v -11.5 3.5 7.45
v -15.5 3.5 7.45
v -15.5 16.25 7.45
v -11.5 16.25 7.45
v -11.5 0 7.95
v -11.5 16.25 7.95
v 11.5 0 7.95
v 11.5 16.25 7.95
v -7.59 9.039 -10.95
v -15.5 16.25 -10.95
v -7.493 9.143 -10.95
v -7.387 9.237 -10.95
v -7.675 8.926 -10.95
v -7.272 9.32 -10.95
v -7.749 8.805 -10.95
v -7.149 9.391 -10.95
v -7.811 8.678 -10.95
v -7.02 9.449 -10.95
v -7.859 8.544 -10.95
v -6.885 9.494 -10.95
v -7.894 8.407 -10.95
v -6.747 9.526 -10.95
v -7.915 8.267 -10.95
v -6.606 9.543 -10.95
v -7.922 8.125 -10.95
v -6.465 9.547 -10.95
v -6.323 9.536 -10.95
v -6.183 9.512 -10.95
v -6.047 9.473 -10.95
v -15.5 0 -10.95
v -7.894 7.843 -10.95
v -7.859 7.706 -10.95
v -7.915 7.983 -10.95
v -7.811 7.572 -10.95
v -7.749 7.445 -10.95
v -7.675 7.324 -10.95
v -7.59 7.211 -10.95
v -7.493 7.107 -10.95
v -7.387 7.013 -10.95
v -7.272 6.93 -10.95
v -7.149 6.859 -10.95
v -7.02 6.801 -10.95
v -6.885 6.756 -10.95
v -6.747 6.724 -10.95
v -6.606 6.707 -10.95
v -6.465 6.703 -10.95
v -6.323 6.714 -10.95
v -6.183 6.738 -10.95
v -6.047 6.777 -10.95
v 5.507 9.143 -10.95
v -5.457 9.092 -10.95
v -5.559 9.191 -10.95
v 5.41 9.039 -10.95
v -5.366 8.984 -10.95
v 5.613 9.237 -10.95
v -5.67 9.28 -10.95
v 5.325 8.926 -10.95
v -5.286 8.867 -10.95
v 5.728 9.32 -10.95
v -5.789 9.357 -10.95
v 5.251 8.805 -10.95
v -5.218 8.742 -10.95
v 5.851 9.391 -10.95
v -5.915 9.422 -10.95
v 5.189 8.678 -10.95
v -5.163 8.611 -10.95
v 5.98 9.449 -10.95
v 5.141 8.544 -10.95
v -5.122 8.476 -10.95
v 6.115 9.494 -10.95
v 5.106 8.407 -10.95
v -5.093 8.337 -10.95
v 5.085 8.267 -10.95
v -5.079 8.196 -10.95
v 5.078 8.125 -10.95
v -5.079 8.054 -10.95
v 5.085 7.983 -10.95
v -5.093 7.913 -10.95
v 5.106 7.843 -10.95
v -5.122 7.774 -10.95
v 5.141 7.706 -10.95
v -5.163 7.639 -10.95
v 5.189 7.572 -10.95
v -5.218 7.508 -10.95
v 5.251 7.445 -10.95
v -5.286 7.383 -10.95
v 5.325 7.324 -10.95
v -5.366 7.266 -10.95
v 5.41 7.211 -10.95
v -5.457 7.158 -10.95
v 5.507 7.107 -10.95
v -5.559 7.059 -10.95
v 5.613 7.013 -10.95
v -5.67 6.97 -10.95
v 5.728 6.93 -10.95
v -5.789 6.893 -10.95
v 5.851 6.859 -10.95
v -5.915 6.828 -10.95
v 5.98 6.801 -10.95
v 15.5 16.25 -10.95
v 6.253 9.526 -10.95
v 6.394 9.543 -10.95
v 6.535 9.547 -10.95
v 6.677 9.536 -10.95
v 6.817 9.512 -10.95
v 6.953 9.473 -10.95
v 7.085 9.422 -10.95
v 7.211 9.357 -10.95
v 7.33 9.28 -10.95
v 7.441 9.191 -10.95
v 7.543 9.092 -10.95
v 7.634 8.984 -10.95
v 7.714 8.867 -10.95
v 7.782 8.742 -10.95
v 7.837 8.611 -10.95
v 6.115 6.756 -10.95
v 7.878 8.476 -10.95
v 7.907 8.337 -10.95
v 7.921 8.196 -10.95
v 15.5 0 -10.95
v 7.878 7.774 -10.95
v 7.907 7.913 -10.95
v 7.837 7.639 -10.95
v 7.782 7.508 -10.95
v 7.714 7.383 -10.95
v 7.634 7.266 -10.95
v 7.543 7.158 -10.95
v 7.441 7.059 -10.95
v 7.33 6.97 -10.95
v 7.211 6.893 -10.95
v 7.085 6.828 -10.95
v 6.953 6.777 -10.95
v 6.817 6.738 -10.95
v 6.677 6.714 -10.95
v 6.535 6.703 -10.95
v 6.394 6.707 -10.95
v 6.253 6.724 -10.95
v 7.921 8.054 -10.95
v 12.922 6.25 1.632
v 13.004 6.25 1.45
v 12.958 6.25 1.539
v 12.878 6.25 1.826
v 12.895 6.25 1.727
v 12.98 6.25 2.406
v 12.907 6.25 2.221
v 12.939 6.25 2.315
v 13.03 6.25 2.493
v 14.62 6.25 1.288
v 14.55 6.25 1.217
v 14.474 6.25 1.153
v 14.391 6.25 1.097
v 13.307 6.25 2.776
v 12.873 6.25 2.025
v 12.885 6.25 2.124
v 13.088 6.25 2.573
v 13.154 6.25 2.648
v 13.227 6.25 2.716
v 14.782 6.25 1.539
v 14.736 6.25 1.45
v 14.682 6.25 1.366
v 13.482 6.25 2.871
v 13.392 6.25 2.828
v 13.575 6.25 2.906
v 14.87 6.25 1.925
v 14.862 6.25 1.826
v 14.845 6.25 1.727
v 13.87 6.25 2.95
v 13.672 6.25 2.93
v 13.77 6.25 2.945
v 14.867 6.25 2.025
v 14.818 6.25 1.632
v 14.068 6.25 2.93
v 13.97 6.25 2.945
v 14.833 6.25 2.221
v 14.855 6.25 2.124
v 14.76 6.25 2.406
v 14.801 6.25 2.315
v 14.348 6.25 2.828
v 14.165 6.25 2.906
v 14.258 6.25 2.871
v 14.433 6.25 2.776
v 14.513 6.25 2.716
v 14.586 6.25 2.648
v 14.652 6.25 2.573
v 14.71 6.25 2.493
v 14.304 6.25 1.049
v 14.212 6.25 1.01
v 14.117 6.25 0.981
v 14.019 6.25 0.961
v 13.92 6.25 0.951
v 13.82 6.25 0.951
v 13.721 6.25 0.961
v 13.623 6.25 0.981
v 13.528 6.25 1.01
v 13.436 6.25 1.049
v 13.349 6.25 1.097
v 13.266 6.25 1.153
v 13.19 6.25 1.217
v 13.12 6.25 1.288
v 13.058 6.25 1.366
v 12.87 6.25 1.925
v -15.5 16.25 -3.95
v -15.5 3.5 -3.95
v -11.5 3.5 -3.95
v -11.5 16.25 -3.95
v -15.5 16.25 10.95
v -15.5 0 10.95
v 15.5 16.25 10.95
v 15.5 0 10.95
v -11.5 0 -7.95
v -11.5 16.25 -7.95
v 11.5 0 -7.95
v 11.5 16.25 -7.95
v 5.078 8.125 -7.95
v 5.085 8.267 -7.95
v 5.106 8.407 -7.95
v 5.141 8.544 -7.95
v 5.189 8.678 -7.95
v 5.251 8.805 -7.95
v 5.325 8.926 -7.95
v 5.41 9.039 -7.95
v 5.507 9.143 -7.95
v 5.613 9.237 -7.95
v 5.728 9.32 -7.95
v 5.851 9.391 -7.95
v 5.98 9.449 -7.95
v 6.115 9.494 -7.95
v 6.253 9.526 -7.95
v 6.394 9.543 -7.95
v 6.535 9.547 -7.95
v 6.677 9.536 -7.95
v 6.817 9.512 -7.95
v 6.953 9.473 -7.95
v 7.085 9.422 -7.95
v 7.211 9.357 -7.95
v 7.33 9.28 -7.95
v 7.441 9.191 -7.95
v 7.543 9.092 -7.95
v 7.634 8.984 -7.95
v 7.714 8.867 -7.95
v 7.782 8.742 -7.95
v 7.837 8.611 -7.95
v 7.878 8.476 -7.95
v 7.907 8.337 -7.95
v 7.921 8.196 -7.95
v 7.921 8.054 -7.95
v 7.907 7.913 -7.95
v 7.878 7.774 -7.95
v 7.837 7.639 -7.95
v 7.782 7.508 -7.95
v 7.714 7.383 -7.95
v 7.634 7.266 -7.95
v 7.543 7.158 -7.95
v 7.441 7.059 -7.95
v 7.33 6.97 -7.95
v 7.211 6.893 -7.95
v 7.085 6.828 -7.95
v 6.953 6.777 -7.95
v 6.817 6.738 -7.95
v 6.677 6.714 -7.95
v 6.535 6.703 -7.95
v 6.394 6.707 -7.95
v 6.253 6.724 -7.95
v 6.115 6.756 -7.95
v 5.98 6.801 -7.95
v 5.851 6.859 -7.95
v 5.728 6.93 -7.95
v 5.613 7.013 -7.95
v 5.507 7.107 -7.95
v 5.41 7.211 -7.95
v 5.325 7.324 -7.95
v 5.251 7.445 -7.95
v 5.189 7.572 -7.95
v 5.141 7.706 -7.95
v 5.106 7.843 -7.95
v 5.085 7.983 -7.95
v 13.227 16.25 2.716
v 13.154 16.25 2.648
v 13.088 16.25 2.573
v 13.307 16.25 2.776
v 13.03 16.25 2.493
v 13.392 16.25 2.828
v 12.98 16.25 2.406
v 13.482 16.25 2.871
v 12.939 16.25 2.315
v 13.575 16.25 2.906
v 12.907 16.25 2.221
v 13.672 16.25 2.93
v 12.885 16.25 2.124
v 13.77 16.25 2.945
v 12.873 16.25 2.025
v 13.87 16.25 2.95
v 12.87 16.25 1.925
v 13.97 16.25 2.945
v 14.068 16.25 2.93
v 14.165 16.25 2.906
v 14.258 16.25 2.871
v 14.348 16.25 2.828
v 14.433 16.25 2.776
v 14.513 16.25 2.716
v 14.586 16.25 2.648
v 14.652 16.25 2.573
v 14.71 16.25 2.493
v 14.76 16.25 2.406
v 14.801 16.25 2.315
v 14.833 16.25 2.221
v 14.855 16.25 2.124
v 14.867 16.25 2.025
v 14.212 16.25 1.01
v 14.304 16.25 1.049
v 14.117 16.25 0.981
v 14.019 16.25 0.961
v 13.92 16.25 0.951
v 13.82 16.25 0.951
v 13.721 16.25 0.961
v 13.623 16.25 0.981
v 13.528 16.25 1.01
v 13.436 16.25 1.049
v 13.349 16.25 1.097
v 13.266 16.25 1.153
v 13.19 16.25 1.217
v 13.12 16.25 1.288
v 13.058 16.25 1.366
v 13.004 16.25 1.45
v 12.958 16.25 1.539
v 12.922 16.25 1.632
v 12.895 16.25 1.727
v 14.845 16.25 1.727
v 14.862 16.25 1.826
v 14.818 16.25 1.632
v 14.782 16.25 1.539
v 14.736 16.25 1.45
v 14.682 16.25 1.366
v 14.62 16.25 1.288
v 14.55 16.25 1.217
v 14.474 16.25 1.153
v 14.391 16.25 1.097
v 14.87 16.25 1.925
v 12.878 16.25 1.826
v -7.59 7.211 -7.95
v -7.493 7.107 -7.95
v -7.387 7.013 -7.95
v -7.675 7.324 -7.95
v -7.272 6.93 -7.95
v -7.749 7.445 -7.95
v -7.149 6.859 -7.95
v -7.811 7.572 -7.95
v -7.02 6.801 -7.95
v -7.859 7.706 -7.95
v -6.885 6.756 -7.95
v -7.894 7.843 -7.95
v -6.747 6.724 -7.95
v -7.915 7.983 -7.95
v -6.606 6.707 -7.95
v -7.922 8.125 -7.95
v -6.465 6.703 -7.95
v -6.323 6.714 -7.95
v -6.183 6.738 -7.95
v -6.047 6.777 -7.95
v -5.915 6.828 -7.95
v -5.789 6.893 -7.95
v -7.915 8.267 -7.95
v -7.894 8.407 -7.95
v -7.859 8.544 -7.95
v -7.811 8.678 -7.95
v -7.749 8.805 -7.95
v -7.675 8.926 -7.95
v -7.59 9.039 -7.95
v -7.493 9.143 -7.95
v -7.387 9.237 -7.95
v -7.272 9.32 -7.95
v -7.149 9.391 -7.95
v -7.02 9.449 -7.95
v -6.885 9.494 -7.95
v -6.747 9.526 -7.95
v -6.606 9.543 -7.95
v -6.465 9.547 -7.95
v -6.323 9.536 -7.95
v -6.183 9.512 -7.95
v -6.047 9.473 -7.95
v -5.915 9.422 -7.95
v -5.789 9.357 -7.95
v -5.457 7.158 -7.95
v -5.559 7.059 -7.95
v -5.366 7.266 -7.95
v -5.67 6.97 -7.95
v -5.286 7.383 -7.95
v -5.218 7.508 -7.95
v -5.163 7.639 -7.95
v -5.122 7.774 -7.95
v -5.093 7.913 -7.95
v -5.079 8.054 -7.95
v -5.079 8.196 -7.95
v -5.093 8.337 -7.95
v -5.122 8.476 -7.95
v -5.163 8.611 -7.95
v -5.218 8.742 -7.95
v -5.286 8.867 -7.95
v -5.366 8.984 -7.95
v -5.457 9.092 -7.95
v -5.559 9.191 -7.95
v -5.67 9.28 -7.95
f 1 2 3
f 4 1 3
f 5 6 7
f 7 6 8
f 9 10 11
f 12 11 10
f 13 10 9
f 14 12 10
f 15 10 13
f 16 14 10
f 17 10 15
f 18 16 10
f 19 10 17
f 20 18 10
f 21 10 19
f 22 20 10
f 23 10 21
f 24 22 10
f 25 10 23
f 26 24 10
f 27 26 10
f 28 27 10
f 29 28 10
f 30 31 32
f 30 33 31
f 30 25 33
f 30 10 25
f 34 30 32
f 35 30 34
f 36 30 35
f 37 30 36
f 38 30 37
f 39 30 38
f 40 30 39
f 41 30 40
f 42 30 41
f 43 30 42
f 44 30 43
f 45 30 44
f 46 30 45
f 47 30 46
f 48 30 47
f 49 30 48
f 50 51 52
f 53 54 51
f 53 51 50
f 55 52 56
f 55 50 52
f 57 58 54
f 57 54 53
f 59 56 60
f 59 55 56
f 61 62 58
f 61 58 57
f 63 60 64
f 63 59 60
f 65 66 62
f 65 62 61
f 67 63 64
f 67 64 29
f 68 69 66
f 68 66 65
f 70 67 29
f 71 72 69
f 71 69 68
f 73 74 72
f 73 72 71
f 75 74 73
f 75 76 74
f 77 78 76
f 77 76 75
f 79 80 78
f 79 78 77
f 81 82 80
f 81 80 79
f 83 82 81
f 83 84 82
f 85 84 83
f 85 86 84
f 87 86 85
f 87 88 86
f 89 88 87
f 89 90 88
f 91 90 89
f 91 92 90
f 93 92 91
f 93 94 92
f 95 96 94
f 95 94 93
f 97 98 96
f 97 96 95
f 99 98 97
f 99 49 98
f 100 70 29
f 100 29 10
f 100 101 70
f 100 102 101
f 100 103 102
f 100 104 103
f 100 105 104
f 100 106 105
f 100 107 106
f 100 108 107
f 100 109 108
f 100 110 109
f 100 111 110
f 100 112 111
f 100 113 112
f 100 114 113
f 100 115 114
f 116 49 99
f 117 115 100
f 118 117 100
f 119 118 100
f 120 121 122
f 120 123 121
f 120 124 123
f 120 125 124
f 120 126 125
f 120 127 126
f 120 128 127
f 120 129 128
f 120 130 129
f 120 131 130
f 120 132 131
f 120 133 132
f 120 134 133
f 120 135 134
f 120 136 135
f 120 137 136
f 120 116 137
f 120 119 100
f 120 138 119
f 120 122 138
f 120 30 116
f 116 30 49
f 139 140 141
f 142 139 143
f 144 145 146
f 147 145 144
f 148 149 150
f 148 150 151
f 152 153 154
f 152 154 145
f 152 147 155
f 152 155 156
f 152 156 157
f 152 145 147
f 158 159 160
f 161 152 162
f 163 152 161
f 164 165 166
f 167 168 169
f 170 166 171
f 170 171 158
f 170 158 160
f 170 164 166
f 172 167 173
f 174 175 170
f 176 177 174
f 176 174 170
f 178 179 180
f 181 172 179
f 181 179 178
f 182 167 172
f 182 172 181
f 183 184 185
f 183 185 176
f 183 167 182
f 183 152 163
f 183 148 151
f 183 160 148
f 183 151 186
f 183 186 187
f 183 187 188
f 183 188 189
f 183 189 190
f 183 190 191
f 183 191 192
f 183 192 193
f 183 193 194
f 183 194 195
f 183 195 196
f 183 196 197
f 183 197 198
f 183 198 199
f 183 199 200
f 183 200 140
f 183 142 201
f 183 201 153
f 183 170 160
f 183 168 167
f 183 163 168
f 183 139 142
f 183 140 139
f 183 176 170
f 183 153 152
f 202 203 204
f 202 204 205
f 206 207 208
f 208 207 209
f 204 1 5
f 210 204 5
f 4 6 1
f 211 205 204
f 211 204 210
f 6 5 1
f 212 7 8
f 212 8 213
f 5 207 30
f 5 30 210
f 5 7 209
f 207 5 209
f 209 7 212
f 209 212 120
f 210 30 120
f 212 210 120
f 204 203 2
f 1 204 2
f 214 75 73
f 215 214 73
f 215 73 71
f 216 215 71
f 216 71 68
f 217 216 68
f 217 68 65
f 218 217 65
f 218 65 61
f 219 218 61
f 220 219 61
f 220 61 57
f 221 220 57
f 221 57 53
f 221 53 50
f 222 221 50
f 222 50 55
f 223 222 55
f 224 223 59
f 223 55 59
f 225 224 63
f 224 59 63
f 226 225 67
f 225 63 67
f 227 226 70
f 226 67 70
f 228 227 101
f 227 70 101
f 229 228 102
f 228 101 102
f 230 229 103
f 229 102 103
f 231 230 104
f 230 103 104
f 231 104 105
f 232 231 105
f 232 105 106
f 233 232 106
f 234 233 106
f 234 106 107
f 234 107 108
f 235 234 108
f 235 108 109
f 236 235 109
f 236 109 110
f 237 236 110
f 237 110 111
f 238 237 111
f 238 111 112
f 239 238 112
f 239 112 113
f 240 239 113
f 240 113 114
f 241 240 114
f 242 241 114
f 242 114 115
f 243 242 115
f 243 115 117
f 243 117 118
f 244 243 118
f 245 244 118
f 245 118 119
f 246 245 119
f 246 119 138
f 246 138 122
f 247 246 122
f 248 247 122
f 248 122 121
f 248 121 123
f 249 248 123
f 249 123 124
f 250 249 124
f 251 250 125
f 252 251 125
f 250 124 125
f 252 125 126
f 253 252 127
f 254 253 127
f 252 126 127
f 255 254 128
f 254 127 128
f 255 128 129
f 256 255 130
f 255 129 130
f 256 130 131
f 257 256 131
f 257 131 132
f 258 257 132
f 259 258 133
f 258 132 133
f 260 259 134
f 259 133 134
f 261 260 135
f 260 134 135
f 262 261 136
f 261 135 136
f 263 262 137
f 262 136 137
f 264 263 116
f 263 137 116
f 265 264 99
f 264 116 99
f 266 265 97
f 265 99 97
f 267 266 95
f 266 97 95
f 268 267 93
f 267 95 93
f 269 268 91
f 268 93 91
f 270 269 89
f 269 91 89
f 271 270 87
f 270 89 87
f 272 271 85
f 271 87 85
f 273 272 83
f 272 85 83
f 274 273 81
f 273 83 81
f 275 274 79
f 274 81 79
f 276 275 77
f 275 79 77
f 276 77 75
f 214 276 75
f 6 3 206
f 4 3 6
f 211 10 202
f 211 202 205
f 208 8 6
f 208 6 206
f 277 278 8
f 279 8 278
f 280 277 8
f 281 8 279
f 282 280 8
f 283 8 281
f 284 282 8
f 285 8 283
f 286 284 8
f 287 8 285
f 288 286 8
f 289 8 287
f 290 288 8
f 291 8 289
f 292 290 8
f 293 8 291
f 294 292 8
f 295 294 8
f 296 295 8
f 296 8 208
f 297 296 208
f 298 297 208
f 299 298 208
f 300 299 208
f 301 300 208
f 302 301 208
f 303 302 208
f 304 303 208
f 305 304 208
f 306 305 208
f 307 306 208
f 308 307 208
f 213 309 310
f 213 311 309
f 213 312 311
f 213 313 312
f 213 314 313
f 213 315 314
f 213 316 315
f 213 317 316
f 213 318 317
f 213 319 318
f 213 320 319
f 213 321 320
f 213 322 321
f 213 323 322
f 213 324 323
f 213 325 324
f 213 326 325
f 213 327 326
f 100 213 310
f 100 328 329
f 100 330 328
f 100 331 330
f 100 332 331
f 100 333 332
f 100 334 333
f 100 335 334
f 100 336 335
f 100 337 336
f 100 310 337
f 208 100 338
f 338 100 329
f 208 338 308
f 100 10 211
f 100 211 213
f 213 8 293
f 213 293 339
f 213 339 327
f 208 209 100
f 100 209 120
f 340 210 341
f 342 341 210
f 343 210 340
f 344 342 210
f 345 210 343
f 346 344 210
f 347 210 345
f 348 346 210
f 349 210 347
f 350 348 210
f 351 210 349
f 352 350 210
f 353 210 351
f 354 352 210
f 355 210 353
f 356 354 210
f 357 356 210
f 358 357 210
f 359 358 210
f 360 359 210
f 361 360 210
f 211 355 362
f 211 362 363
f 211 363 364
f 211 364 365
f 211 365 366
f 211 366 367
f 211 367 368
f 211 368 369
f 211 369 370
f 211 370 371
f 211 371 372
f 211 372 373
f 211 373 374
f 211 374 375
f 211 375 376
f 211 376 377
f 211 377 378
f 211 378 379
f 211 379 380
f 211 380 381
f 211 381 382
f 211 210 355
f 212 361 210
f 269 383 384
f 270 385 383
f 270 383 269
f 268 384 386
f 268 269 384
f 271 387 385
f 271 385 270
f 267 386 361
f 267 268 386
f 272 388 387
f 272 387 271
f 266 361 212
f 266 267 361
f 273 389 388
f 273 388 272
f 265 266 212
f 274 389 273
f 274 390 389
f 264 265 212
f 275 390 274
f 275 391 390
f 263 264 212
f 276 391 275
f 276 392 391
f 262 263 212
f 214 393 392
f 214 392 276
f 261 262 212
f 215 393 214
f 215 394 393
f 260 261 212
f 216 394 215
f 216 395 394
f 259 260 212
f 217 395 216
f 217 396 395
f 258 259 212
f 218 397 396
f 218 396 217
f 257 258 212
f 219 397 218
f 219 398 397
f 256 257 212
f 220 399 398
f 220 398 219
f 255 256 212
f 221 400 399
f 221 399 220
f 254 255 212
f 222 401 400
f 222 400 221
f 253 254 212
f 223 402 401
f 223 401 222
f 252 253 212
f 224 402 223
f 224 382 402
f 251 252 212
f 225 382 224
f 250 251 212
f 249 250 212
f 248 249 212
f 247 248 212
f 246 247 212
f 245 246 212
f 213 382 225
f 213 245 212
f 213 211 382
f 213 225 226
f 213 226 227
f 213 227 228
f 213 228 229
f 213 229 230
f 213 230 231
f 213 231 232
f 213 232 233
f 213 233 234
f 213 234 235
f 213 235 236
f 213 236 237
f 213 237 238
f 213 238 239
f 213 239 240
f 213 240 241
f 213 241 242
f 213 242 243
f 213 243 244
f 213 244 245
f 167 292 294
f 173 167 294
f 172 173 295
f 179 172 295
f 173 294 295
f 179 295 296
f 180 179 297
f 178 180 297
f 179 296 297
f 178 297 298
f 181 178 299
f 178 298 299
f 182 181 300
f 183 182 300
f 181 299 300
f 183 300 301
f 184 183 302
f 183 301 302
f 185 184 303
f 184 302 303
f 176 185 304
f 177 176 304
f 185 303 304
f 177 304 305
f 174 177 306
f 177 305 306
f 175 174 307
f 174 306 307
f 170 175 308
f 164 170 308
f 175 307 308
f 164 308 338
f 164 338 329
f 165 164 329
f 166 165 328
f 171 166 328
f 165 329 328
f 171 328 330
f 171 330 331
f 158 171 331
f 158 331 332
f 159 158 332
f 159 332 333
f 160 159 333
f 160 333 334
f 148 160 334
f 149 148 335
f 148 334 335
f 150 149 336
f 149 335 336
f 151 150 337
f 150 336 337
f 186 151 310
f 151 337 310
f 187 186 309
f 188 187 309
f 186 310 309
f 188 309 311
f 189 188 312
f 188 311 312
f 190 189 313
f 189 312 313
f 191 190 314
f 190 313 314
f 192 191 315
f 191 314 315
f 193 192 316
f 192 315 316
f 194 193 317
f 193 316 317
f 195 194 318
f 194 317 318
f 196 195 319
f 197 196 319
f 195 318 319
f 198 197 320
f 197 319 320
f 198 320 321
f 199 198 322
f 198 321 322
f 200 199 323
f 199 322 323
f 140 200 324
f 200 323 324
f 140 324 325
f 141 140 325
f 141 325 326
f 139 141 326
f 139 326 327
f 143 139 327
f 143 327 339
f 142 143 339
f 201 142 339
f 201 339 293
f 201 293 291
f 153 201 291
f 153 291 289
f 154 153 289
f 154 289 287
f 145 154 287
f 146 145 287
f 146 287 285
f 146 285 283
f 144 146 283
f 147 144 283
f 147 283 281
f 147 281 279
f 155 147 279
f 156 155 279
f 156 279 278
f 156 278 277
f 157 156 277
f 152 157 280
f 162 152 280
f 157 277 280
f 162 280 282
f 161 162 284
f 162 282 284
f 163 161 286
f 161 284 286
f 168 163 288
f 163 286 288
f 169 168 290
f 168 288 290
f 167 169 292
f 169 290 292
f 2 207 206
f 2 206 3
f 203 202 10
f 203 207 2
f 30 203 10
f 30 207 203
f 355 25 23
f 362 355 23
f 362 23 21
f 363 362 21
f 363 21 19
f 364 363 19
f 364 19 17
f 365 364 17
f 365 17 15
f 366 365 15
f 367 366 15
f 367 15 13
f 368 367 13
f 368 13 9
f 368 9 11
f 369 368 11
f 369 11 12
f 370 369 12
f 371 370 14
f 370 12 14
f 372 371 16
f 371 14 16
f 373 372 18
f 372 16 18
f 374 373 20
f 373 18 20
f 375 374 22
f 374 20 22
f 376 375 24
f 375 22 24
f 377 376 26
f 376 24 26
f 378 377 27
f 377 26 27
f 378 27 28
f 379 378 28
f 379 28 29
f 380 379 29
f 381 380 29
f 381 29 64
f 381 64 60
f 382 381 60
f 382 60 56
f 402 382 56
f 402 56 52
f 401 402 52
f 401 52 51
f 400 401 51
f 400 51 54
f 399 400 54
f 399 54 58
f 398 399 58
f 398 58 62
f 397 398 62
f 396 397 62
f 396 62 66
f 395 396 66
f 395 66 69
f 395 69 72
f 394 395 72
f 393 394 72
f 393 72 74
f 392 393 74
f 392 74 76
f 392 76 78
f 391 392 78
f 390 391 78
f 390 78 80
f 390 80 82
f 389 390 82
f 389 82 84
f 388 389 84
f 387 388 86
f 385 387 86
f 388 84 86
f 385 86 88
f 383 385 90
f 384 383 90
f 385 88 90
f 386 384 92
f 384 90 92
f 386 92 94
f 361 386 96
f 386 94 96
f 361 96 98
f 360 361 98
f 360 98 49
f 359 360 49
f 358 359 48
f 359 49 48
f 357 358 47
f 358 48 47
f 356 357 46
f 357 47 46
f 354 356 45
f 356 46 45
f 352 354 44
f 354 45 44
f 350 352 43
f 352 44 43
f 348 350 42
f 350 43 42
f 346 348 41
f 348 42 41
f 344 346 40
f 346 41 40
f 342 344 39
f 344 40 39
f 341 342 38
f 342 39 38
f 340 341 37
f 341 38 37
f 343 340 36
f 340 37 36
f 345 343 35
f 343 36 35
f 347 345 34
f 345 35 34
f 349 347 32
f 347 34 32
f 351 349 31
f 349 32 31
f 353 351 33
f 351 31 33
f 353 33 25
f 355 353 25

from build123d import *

# Parameters (mm, degrees)
SKETCH2_W           = 31
SKETCH2_H           = 21.9
BOSS_EXTRUDE1_DEPTH = 16.25
SKETCH3_W           = 23
SKETCH3_H           = 15.9
CUT_EXTRUDE1_DEPTH  = 25.984295067
SKETCH6_R           = 1.4224
CUT_EXTRUDE3_DEPTH  = 10
SKETCH7_W           = 11.4
SKETCH7_H           = 9.25
CUT_EXTRUDE4_DEPTH  = 10
SKETCH9_R           = 1
CUT_EXTRUDE5_DEPTH  = 10
SKETCH12_W          = 11.4
SKETCH12_H          = 3.5
CUT_EXTRUDE8_DEPTH  = 4


with BuildPart() as part:
    # Sketch2 → Boss-Extrude1 (new body)
    with BuildSketch(Plane(origin=(0, 0, 0), x_dir=(1, 0, 0), z_dir=(0, 1, 0))):
        Rectangle(SKETCH2_W, SKETCH2_H)
    extrude(amount=BOSS_EXTRUDE1_DEPTH)

    # Sketch3 → Cut-Extrude1 (cut, through all)
    with BuildSketch(Plane(origin=(0, 16.25, 0), x_dir=(1, 0, 0), z_dir=(0, 1, 0))):
        Rectangle(SKETCH3_W, SKETCH3_H)
    extrude(amount=-CUT_EXTRUDE1_DEPTH, mode=Mode.SUBTRACT)

    # Sketch6 → Cut-Extrude3 (cut)
    with BuildSketch(Plane(origin=(0, 0, -10.95), x_dir=(-1, 0, 0), z_dir=(0, 0, -1))):
        with Locations((-6.5, 8.125)):
            Circle(SKETCH6_R)
        with Locations((6.5, 8.125)):
            Circle(SKETCH6_R)
    extrude(amount=-CUT_EXTRUDE3_DEPTH, mode=Mode.SUBTRACT)

    # Sketch7 → Cut-Extrude4 (cut)
    with BuildSketch(Plane.ZY.offset(15.5)):
        with Locations((1.75, 8.125)):
            Rectangle(SKETCH7_W, SKETCH7_H)
    extrude(amount=-CUT_EXTRUDE4_DEPTH, mode=Mode.SUBTRACT)

    # Sketch9 → Cut-Extrude5 (cut)
    with BuildSketch(Plane(origin=(0, 16.25, 0), x_dir=(1, 0, 0), z_dir=(0, 1, 0))):
        with Locations(Location((-13.37, -1.95, 0), (0, 0, 270))):
            Circle(SKETCH9_R)
        with Locations(Location((13.87, -1.95, 0), (0, 0, 270))):
            Circle(SKETCH9_R)
    extrude(amount=-CUT_EXTRUDE5_DEPTH, mode=Mode.SUBTRACT)

    # Sketch12 → Cut-Extrude8 (cut)
    with BuildSketch(Plane.ZY.offset(15.5)):
        with Locations((1.75, 14.5)):
            Rectangle(SKETCH12_W, SKETCH12_H)
    extrude(amount=-CUT_EXTRUDE8_DEPTH, mode=Mode.SUBTRACT)


solid = part.part
